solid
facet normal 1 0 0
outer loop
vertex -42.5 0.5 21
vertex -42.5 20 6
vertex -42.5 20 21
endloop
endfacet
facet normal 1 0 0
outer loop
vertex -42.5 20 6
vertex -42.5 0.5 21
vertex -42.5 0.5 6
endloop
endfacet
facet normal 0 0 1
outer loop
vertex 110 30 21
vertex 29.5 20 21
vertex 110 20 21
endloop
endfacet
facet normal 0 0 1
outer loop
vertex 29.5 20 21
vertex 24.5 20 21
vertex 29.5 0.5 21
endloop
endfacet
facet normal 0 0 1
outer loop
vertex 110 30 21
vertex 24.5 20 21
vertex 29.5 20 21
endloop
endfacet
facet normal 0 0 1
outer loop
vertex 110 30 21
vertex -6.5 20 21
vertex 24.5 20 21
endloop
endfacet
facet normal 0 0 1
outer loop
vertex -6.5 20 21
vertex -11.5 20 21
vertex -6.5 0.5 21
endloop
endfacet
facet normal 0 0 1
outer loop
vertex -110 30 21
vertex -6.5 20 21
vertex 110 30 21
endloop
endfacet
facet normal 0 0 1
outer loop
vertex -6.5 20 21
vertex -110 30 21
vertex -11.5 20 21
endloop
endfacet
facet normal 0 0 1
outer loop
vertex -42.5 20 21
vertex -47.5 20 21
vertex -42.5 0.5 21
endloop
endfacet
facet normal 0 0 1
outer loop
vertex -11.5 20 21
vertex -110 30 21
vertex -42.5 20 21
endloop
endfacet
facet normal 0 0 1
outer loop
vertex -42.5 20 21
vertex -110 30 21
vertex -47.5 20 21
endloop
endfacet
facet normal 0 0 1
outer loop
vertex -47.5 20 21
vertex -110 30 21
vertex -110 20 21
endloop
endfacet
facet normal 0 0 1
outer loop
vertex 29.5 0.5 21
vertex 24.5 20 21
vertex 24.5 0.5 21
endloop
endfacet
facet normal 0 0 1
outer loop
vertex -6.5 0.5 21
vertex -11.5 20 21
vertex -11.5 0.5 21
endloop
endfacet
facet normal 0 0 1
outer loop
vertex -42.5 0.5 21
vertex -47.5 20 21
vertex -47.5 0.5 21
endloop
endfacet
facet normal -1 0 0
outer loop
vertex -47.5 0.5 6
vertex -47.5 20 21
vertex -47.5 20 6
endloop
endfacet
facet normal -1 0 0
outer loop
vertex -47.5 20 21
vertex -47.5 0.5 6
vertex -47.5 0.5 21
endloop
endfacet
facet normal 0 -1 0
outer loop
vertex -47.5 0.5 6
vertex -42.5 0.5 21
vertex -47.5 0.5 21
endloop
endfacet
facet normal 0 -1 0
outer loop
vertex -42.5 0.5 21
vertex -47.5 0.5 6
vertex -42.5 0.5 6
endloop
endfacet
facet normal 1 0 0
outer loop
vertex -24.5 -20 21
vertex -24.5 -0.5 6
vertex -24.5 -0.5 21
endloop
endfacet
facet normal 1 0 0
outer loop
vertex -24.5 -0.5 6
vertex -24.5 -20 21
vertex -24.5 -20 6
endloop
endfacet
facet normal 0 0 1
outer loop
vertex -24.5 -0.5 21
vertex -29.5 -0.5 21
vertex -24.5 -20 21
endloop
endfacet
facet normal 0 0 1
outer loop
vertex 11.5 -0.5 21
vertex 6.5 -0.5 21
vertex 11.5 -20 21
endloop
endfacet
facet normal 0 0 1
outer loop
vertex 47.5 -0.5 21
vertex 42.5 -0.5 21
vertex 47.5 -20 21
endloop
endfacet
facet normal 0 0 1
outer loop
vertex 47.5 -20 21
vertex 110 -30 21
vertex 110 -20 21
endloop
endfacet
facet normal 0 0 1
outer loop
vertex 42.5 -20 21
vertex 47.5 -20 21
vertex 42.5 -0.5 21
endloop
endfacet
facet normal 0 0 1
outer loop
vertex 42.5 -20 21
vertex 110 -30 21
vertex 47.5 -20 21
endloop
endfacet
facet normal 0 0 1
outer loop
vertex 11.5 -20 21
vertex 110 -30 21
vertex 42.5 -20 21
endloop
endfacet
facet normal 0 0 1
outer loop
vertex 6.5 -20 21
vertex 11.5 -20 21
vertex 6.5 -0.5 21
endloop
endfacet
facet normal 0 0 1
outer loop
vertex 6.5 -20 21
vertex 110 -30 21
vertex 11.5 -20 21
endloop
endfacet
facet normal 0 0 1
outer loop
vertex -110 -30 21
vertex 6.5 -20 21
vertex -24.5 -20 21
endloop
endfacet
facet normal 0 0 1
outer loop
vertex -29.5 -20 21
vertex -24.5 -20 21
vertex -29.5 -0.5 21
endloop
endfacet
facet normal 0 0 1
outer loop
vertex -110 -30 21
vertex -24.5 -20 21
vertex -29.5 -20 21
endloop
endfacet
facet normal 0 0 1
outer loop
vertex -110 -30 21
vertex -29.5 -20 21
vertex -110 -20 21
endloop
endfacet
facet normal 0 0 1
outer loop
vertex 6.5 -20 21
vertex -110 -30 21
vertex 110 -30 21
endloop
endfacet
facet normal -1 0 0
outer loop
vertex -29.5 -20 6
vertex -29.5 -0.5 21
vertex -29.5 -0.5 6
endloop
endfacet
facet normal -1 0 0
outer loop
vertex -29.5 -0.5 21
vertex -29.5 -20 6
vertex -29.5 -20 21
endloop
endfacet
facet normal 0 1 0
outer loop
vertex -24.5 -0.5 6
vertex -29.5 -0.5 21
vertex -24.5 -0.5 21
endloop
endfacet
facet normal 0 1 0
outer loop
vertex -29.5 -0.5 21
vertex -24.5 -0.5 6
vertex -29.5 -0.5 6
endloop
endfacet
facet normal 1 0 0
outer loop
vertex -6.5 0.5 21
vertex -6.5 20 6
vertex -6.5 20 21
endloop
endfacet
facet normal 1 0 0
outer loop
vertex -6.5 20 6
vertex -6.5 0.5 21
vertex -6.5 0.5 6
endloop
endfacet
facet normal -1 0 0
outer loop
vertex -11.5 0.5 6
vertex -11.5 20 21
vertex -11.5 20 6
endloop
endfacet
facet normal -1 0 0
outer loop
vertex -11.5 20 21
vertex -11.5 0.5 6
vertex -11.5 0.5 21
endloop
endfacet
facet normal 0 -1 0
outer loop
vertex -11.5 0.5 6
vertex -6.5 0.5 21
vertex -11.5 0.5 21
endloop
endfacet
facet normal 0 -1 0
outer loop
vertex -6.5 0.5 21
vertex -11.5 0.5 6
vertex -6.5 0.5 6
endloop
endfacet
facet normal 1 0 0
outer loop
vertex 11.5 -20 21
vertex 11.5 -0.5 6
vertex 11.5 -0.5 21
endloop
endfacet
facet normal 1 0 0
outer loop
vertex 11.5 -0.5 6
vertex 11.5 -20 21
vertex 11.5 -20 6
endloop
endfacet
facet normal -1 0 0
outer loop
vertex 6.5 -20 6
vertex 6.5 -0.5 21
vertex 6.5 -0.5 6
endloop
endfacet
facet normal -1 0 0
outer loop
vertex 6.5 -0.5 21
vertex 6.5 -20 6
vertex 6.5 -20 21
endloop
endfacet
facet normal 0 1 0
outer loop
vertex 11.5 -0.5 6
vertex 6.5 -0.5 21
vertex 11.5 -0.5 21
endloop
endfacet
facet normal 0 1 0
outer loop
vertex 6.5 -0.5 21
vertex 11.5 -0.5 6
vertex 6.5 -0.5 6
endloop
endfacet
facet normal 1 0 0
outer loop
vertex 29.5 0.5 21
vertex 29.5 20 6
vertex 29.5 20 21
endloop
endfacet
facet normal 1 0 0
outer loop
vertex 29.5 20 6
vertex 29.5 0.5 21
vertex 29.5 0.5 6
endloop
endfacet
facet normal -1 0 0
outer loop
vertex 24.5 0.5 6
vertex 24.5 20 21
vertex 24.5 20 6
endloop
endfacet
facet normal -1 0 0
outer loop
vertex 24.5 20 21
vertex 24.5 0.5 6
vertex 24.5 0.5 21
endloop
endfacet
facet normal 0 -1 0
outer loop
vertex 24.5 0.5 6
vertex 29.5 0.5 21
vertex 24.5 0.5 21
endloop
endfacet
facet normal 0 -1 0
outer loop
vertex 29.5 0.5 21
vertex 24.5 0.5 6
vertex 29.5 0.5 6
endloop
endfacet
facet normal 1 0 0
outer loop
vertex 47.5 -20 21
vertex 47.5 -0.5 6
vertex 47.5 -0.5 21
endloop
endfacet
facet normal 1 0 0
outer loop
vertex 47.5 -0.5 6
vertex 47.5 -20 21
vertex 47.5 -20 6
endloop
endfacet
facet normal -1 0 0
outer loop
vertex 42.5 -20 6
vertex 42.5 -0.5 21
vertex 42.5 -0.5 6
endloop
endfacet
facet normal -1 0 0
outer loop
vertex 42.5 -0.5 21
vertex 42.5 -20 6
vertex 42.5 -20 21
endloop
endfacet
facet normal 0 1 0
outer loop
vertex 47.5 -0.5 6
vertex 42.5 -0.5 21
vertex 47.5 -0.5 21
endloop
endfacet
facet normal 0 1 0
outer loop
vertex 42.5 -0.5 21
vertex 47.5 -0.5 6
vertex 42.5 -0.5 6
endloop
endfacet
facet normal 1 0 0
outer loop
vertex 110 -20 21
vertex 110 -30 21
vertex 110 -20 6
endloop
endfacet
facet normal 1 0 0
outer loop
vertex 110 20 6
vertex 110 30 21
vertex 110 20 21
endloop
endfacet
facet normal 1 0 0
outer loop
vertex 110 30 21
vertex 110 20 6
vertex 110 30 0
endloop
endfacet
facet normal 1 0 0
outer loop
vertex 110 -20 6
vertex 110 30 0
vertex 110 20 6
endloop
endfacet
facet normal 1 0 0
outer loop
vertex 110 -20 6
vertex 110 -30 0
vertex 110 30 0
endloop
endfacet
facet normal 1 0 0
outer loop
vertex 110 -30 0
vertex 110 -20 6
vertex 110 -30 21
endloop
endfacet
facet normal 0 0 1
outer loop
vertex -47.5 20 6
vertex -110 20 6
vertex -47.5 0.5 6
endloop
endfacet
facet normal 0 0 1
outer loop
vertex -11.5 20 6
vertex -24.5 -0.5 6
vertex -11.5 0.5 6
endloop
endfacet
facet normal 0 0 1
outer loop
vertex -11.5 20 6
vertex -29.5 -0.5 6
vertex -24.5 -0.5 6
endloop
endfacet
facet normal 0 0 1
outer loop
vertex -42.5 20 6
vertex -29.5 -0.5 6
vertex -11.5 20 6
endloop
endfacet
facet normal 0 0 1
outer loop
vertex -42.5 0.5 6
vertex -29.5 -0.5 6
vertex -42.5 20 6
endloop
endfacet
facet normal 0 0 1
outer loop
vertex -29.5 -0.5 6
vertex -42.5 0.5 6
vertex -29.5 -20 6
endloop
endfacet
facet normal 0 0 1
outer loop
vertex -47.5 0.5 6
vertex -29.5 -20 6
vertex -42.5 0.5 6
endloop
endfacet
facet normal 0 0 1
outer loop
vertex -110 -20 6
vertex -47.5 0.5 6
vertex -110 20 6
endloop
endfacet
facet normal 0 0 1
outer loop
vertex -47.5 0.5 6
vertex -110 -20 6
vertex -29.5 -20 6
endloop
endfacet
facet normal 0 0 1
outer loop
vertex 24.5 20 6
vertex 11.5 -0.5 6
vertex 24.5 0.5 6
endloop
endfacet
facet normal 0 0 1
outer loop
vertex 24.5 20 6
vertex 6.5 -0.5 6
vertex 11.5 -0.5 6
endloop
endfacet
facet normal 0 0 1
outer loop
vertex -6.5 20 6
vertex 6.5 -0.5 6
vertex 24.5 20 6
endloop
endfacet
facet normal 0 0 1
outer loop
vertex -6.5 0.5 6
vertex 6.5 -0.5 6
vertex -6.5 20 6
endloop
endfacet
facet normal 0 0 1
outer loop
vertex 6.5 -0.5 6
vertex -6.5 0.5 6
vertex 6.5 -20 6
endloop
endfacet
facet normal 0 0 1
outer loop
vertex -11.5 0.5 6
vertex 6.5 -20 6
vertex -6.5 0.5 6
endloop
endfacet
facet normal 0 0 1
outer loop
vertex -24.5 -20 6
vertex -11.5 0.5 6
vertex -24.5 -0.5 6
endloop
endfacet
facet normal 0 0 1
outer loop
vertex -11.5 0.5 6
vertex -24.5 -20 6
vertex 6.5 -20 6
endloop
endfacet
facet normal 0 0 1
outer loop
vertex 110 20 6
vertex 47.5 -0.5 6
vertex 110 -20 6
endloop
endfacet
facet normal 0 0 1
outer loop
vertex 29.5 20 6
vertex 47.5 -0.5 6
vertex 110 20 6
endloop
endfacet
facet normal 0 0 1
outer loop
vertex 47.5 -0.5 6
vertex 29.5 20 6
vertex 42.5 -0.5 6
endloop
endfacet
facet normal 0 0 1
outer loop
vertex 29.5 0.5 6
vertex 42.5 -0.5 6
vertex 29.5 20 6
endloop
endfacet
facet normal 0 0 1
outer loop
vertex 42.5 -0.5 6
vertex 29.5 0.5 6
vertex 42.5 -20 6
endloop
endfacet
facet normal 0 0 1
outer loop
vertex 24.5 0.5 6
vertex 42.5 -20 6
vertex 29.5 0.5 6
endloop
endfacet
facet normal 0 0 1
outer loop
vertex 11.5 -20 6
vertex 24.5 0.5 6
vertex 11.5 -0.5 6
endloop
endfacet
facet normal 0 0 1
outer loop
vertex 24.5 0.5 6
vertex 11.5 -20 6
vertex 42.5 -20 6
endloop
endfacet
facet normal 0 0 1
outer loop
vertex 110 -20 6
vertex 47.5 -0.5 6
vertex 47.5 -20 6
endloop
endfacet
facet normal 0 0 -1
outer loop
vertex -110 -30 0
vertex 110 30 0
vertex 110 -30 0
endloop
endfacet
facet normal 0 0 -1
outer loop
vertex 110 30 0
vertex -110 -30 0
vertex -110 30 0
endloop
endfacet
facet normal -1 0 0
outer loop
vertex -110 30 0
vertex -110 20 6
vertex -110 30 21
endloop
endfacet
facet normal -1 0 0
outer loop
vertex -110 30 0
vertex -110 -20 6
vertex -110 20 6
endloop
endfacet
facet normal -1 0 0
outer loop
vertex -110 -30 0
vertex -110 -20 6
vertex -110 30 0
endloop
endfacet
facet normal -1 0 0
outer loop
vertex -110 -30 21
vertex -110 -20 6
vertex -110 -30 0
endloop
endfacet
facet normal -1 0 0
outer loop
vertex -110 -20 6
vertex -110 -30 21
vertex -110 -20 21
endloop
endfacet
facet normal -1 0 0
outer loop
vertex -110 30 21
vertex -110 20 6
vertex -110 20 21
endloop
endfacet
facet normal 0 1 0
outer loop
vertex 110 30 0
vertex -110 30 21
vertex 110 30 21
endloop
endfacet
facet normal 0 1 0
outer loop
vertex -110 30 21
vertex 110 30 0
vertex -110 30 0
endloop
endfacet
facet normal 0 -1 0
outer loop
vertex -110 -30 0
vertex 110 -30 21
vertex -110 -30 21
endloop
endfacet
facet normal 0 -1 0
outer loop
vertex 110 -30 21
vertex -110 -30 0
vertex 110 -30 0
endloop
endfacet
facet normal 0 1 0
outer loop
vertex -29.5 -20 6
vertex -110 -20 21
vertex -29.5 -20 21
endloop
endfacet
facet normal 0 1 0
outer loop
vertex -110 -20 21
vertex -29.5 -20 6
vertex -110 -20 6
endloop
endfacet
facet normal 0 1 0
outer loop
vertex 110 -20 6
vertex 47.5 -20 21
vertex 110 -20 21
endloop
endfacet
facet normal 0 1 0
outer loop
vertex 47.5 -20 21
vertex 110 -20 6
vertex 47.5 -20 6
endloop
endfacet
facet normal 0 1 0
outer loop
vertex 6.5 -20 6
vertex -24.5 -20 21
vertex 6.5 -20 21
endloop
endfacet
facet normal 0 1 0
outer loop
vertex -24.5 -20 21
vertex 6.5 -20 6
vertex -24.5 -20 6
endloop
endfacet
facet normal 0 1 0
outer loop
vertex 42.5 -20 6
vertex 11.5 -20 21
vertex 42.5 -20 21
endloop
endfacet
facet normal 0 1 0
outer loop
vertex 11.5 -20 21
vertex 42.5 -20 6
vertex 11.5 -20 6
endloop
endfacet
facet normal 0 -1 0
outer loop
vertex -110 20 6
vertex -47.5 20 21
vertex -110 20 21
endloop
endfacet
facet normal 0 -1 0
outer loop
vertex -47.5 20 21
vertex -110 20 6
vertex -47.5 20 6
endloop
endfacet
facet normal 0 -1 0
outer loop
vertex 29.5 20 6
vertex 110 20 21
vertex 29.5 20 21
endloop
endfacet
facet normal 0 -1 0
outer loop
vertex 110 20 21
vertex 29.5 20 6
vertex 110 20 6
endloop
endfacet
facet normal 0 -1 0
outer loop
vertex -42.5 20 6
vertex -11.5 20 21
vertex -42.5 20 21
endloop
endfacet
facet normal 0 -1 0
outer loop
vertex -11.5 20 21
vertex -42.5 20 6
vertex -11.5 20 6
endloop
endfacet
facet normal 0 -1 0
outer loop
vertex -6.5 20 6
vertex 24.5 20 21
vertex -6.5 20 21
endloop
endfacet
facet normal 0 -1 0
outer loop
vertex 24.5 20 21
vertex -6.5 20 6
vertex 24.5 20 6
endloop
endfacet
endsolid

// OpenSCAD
$fn = 32;

// ----------------------------------------------------------------------
// Rib frame 220 x 60 x 21
// 6 ribs at 18 mm pitch, staggered
// ----------------------------------------------------------------------

// --- parameters (mm) ---
frame = [220, 60, 6];  // base plate size (x, y, z)
rail_w = 10;           // side rail width
ribs = 6;              // number of ribs
rib_t = 5;             // rib thickness
rib_h = 15;            // rib height above the base plate
pitch = 18;            // pitch between rib centres

// --- derived feature positions (mm) ---
span = (ribs - 1) * pitch;          // = 90   distance between the outer ribs
origin_x = -span / 2;               // = -45   X of the first rib
rib_len = frame[1] / 2 - rail_w + 0.5;  // = 20.5   length of a staggered rib
rib_y = 0.5 + rib_len / 2;          // = 10.75   Y of a staggered rib centre
row_offset = 2 * rib_y;             // = 21.5   distance between the two rows
feature_centers = [
  [origin_x + 0 * pitch, rib_y],
  [origin_x + 1 * pitch, -rib_y],
  [origin_x + 2 * pitch, rib_y],
  [origin_x + 3 * pitch, -rib_y],
  [origin_x + 4 * pitch, rib_y],
  [origin_x + 5 * pitch, -rib_y]
];   // rib centre line, drives the rib loop

// base plate, two side rails, then the ribs read straight off feature_centers
union() {
  translate([-frame[0] / 2, -frame[1] / 2, 0]) cube(frame);
  translate([-frame[0] / 2, -frame[1] / 2, 0]) cube([frame[0], rail_w, frame[2] + rib_h]);
  translate([-frame[0] / 2, frame[1] / 2 - rail_w, 0]) cube([frame[0], rail_w, frame[2] + rib_h]);
  for (centre = feature_centers)
    translate([centre[0] - rib_t / 2, centre[1] - rib_len / 2, frame[2] - 1])
      cube([rib_t, rib_len, rib_h + 1]);
}
